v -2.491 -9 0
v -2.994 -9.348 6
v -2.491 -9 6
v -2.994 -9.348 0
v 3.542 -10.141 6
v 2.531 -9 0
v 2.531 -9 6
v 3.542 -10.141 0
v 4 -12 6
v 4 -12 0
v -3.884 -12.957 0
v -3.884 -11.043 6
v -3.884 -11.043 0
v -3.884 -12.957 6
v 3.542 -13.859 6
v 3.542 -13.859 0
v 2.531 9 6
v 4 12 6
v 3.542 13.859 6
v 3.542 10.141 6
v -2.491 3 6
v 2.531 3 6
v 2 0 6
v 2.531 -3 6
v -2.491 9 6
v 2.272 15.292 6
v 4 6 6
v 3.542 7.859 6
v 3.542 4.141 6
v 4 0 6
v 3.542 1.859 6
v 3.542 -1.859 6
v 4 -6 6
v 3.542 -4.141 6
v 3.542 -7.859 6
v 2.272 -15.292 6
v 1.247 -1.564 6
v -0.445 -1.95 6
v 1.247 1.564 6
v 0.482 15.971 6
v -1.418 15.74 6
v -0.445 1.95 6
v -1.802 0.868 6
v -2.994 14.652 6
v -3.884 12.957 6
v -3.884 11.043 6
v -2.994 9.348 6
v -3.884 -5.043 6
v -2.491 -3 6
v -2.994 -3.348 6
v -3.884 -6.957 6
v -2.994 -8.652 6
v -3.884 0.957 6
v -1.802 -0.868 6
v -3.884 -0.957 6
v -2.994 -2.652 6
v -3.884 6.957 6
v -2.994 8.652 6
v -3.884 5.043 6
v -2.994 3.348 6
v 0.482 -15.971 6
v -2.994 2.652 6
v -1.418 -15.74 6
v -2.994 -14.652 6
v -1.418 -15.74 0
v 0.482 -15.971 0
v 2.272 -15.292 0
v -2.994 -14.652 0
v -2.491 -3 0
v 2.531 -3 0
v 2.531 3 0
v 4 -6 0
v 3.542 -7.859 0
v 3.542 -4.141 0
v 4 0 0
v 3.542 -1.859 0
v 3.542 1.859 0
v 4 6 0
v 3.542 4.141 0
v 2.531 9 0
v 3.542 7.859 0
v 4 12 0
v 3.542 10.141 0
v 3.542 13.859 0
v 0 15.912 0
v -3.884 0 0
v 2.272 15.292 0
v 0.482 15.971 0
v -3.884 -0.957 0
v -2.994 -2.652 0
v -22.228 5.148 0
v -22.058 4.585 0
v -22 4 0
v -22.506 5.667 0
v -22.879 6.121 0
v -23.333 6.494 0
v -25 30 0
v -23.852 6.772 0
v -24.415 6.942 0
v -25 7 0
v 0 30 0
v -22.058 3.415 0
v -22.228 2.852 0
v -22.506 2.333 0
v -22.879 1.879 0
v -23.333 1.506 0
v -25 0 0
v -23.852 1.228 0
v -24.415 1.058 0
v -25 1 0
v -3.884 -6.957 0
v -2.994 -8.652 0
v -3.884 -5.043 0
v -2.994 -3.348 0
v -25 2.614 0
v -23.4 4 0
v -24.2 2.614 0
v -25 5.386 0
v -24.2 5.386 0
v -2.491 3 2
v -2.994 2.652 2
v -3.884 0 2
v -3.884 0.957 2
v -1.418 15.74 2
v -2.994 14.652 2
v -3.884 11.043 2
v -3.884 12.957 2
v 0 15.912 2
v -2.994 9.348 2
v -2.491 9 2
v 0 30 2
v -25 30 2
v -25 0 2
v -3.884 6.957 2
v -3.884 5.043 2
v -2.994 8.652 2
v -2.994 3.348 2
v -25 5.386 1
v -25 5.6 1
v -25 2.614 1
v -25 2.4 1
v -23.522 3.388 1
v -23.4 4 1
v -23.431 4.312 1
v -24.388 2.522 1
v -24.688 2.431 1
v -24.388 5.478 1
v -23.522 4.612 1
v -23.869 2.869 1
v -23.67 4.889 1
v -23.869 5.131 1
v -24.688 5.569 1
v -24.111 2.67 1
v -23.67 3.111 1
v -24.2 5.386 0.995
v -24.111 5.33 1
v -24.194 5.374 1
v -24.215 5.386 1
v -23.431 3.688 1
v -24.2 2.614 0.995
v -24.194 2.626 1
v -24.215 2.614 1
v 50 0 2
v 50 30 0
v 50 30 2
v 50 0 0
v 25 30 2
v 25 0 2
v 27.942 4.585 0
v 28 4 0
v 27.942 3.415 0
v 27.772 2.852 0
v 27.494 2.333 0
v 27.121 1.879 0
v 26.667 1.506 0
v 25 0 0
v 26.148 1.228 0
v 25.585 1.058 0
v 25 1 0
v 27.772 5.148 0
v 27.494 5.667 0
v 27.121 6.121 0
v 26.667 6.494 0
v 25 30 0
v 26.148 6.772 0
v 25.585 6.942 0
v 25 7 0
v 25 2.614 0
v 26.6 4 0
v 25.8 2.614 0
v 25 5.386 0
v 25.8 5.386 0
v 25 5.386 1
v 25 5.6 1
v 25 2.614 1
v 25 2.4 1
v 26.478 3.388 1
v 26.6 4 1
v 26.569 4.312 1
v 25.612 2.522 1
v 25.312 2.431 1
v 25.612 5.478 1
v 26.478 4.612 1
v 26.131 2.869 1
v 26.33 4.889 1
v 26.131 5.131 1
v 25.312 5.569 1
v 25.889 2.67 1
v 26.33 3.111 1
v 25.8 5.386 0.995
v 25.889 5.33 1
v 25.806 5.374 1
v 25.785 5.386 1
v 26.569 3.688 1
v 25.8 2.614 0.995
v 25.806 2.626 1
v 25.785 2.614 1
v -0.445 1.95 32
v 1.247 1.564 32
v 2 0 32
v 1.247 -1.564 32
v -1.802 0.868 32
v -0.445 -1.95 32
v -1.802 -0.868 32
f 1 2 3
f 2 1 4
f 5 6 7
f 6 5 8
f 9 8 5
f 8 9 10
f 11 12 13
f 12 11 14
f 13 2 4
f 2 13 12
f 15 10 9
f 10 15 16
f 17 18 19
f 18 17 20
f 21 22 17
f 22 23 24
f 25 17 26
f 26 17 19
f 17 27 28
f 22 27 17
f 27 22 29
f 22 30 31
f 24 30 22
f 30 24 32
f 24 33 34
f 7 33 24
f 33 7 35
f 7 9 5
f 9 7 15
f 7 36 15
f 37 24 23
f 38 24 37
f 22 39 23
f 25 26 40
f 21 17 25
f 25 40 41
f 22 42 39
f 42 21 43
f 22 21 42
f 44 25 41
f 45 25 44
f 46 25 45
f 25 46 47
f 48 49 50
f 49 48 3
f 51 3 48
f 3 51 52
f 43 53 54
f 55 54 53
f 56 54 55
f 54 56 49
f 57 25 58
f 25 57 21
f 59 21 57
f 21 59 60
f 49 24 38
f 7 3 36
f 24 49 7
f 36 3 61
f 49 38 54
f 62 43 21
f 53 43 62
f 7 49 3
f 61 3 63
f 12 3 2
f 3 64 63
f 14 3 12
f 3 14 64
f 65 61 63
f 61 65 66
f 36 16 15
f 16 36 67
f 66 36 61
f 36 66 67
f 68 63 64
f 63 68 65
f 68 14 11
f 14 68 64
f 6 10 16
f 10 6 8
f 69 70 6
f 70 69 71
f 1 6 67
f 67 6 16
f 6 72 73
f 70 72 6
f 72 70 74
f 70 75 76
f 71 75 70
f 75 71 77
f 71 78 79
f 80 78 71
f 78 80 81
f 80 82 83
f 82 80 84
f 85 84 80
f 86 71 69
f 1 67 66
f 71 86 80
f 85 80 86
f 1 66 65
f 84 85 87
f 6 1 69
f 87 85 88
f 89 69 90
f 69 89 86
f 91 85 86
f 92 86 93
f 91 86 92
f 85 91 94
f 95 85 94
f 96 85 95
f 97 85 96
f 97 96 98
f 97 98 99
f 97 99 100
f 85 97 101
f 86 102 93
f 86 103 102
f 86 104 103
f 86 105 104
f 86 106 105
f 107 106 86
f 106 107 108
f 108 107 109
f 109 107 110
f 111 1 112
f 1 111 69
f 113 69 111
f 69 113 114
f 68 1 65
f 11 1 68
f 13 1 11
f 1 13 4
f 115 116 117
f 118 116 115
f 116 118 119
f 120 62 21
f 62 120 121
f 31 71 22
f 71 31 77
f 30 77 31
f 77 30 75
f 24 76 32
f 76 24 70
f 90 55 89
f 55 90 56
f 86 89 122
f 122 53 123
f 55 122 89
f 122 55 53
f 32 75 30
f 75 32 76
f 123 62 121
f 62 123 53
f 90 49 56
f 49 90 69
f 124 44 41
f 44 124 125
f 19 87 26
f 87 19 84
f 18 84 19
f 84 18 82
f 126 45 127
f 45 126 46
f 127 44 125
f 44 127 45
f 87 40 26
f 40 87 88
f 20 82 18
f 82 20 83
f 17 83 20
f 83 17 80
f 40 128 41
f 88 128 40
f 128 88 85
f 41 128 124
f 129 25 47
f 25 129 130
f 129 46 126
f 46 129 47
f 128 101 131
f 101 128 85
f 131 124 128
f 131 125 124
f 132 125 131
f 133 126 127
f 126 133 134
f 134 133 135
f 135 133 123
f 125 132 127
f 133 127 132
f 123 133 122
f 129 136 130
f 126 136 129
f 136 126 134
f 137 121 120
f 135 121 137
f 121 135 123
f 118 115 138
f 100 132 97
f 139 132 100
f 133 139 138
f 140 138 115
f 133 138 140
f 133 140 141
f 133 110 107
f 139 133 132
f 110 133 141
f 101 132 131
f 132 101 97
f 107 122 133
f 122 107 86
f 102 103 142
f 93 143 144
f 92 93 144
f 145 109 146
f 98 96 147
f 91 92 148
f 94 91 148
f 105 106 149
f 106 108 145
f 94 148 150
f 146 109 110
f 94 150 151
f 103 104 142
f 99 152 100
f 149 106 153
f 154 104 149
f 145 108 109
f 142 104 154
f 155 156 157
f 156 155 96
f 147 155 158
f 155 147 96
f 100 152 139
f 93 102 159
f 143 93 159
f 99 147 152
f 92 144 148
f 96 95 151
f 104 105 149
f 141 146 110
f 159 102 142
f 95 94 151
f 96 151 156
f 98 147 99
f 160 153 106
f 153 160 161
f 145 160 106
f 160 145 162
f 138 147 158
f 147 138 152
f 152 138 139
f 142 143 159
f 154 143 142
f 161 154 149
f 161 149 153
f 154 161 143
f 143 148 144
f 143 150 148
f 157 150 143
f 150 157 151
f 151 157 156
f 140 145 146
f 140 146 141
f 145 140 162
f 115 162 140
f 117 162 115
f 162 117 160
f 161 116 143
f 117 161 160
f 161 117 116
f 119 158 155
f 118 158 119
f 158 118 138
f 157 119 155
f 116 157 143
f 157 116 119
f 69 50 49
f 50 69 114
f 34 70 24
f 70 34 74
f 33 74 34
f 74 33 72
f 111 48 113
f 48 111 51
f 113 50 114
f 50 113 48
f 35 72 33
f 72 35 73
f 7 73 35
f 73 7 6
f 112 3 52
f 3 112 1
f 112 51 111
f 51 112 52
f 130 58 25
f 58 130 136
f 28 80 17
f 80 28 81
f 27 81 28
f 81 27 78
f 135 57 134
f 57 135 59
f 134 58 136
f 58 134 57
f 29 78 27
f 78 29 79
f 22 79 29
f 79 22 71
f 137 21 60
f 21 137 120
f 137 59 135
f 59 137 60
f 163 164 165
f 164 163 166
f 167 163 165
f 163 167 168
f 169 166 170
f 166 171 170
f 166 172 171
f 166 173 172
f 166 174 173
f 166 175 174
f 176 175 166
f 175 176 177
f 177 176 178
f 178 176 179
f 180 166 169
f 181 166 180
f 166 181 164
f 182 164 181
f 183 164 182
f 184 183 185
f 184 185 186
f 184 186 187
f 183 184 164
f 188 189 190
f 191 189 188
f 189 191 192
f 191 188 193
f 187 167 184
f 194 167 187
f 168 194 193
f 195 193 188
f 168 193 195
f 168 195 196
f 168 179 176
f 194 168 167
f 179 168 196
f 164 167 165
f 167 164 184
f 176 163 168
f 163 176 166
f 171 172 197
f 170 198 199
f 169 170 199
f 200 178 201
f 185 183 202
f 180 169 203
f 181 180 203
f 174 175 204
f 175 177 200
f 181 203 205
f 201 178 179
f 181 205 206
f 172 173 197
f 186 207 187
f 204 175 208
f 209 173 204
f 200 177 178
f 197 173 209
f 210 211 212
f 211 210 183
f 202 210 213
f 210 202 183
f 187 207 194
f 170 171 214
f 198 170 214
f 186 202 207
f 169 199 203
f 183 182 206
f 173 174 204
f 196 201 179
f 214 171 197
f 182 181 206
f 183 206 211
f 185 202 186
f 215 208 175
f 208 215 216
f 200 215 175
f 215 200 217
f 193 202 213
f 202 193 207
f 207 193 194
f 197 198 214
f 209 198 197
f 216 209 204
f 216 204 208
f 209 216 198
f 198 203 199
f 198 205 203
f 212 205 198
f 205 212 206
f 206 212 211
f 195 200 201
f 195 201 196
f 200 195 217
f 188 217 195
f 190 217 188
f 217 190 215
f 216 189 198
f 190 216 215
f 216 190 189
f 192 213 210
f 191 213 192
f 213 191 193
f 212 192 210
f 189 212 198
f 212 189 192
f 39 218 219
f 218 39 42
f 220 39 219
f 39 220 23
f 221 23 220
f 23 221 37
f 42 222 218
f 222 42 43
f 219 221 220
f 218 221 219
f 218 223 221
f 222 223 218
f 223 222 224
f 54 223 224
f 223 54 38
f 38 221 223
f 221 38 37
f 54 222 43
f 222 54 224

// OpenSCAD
// 家具用小型バット蝶番 (180°開き)
// 3 パーツ構成：左板、右板、ピン軸

module hinge_part_left() {
    // 左板 (鉄板形状：30mm x 25mm x 2mm)
    // 縦 30mm (Y 軸) がピン軸に沿う
    // 横 25mm (X 軸) が回転で開く方向
    // 位置：X < 0 側
    difference() {
        // 本体
        union() {
            // 板 - translate して配置
            translate([-25, 0, 0]) {
                cube([25, 30, 2], center = [0, 0, 0]);
            }
            
            // 筒部 (knuckle) 3 つ (OD 8mm, ID 4.6mm, 長さ 6mm)
            // 縦 30mm を 5 等分 (各 6mm)
            // 左板は外側 2 個 + 中央 1 個 (Y: -15..-9, -3..3, 9..15)
            for (y = [-15, -3, 9]) {
                translate([0, y + 3, 0]) {
                    cylinder(h = 6, r = 4);
                }
            }
        }
        
        // M3 皿穴 3 つ
        // 位置：X = -25mm (板の端), Y = -12, -4, 4mm
        for (y = [-12, -4, 4]) {
            // 皿穴：表面から直径 6mm x 深さ 1mm テーパ + 直径 3.2mm 貫通穴
            // Z = 0 中心，板厚 2mm
            translate([-25, y, 0]) {
                difference() {
                    // テーパ穴
                    cylinder(h = 1, r1 = 3, r2 = 1.6, $fn = 32);
                    // 貫通穴
                    cylinder(h = 2, r = 1.6);
                }
            }
        }
    }
}

module hinge_part_right() {
    // 右板 (鉄板形状：30mm x 25mm x 2mm)
    // 位置：X > 0 側
    difference() {
        // 本体
        union() {
            // 板
            translate([25, 0, 0]) {
                cube([25, 30, 2], center = [0, 0, 0]);
            }
            
            // 筒部 (knuckle) 2 つ (OD 8mm, ID 4.6mm, 長さ 6mm)
            // 右板は中間 2 個 (Y: -9..-3, 3..9)
            for (y = [-9, 3]) {
                translate([0, y + 3, 0]) {
                    cylinder(h = 6, r = 4);
                }
            }
        }
        
        // M3 皿穴 3 つ
        // 位置：X = 25mm (板の端), Y = -12, -4, 4mm
        for (y = [-12, -4, 4]) {
            // 皿穴
            translate([25, y, 0]) {
                difference() {
                    // テーパ穴
                    cylinder(h = 1, r1 = 3, r2 = 1.6, $fn = 32);
                    // 貫通穴
                    cylinder(h = 2, r = 1.6);
                }
            }
        }
    }
}

module hinge_pin() {
    // ピン軸 (直径 4mm, 長さ 32mm)
    // 両端 1mm ずつ knuckle から飛び出す
    // knuckle 全体 30mm (-15..15) なので、ピンは -16..16
    cylinder(h = 32, r = 2, center = [0, 0, 0]);
}

difference() {
    union() {
        hinge_part_left();
        hinge_part_right();
        hinge_pin();
    }
}
